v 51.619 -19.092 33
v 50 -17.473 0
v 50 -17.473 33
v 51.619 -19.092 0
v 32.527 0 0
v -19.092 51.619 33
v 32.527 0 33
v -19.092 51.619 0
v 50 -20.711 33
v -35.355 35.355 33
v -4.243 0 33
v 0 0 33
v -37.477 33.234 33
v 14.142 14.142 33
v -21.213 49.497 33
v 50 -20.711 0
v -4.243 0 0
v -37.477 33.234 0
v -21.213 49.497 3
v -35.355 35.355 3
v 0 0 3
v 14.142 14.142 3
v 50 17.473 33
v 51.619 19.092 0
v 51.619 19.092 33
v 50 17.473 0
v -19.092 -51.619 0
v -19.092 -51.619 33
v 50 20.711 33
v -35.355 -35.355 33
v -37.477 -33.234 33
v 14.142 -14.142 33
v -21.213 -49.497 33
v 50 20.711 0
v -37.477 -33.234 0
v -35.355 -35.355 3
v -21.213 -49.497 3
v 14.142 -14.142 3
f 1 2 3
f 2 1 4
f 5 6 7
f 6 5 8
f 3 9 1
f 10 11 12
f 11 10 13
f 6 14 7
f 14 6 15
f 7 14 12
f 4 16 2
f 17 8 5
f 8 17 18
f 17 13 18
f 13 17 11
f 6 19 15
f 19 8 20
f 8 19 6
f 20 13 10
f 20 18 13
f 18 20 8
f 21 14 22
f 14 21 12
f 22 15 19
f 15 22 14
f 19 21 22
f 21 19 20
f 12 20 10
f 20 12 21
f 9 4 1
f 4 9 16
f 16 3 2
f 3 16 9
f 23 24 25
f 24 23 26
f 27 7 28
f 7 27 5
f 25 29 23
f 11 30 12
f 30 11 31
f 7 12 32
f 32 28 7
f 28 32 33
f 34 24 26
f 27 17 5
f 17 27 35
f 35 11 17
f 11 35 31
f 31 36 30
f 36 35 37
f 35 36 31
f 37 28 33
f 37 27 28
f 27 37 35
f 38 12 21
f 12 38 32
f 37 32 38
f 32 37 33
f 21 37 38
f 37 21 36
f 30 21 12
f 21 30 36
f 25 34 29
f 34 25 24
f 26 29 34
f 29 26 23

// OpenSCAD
bezelDepth = 20;
bezelHeight = 30;
width = 50;
angle = 90;
wall = 3;

wig = true;

outer = [  bezelDepth + wall * 2
         , width
         , bezelHeight + wall];
         
inner = [  bezelDepth
         , width
         , bezelHeight];
b = max(outer.x, outer.y, outer.z);
big = [b, b, b];
         
uShapeAngle();
mirror([0, -1, 0]) uShapeAngle();

module uShapeAngle() {
    difference() {
        rotate([0, 0, angle / 2]) 
        translate([-wall, 0, 0])  {
            uShape();
            translate([0, -outer.y, 0])
                if (wig) {
                    cube(outer);
                } else {
                    uShape();
                }
        }
        translate([0, -big.y, 0])
            cube(big * 2, center = true);
    }
}

module uShape() {
    difference() {
        cube(outer);
        translate([wall, 0, wall])
            cube(inner);
    }
}
